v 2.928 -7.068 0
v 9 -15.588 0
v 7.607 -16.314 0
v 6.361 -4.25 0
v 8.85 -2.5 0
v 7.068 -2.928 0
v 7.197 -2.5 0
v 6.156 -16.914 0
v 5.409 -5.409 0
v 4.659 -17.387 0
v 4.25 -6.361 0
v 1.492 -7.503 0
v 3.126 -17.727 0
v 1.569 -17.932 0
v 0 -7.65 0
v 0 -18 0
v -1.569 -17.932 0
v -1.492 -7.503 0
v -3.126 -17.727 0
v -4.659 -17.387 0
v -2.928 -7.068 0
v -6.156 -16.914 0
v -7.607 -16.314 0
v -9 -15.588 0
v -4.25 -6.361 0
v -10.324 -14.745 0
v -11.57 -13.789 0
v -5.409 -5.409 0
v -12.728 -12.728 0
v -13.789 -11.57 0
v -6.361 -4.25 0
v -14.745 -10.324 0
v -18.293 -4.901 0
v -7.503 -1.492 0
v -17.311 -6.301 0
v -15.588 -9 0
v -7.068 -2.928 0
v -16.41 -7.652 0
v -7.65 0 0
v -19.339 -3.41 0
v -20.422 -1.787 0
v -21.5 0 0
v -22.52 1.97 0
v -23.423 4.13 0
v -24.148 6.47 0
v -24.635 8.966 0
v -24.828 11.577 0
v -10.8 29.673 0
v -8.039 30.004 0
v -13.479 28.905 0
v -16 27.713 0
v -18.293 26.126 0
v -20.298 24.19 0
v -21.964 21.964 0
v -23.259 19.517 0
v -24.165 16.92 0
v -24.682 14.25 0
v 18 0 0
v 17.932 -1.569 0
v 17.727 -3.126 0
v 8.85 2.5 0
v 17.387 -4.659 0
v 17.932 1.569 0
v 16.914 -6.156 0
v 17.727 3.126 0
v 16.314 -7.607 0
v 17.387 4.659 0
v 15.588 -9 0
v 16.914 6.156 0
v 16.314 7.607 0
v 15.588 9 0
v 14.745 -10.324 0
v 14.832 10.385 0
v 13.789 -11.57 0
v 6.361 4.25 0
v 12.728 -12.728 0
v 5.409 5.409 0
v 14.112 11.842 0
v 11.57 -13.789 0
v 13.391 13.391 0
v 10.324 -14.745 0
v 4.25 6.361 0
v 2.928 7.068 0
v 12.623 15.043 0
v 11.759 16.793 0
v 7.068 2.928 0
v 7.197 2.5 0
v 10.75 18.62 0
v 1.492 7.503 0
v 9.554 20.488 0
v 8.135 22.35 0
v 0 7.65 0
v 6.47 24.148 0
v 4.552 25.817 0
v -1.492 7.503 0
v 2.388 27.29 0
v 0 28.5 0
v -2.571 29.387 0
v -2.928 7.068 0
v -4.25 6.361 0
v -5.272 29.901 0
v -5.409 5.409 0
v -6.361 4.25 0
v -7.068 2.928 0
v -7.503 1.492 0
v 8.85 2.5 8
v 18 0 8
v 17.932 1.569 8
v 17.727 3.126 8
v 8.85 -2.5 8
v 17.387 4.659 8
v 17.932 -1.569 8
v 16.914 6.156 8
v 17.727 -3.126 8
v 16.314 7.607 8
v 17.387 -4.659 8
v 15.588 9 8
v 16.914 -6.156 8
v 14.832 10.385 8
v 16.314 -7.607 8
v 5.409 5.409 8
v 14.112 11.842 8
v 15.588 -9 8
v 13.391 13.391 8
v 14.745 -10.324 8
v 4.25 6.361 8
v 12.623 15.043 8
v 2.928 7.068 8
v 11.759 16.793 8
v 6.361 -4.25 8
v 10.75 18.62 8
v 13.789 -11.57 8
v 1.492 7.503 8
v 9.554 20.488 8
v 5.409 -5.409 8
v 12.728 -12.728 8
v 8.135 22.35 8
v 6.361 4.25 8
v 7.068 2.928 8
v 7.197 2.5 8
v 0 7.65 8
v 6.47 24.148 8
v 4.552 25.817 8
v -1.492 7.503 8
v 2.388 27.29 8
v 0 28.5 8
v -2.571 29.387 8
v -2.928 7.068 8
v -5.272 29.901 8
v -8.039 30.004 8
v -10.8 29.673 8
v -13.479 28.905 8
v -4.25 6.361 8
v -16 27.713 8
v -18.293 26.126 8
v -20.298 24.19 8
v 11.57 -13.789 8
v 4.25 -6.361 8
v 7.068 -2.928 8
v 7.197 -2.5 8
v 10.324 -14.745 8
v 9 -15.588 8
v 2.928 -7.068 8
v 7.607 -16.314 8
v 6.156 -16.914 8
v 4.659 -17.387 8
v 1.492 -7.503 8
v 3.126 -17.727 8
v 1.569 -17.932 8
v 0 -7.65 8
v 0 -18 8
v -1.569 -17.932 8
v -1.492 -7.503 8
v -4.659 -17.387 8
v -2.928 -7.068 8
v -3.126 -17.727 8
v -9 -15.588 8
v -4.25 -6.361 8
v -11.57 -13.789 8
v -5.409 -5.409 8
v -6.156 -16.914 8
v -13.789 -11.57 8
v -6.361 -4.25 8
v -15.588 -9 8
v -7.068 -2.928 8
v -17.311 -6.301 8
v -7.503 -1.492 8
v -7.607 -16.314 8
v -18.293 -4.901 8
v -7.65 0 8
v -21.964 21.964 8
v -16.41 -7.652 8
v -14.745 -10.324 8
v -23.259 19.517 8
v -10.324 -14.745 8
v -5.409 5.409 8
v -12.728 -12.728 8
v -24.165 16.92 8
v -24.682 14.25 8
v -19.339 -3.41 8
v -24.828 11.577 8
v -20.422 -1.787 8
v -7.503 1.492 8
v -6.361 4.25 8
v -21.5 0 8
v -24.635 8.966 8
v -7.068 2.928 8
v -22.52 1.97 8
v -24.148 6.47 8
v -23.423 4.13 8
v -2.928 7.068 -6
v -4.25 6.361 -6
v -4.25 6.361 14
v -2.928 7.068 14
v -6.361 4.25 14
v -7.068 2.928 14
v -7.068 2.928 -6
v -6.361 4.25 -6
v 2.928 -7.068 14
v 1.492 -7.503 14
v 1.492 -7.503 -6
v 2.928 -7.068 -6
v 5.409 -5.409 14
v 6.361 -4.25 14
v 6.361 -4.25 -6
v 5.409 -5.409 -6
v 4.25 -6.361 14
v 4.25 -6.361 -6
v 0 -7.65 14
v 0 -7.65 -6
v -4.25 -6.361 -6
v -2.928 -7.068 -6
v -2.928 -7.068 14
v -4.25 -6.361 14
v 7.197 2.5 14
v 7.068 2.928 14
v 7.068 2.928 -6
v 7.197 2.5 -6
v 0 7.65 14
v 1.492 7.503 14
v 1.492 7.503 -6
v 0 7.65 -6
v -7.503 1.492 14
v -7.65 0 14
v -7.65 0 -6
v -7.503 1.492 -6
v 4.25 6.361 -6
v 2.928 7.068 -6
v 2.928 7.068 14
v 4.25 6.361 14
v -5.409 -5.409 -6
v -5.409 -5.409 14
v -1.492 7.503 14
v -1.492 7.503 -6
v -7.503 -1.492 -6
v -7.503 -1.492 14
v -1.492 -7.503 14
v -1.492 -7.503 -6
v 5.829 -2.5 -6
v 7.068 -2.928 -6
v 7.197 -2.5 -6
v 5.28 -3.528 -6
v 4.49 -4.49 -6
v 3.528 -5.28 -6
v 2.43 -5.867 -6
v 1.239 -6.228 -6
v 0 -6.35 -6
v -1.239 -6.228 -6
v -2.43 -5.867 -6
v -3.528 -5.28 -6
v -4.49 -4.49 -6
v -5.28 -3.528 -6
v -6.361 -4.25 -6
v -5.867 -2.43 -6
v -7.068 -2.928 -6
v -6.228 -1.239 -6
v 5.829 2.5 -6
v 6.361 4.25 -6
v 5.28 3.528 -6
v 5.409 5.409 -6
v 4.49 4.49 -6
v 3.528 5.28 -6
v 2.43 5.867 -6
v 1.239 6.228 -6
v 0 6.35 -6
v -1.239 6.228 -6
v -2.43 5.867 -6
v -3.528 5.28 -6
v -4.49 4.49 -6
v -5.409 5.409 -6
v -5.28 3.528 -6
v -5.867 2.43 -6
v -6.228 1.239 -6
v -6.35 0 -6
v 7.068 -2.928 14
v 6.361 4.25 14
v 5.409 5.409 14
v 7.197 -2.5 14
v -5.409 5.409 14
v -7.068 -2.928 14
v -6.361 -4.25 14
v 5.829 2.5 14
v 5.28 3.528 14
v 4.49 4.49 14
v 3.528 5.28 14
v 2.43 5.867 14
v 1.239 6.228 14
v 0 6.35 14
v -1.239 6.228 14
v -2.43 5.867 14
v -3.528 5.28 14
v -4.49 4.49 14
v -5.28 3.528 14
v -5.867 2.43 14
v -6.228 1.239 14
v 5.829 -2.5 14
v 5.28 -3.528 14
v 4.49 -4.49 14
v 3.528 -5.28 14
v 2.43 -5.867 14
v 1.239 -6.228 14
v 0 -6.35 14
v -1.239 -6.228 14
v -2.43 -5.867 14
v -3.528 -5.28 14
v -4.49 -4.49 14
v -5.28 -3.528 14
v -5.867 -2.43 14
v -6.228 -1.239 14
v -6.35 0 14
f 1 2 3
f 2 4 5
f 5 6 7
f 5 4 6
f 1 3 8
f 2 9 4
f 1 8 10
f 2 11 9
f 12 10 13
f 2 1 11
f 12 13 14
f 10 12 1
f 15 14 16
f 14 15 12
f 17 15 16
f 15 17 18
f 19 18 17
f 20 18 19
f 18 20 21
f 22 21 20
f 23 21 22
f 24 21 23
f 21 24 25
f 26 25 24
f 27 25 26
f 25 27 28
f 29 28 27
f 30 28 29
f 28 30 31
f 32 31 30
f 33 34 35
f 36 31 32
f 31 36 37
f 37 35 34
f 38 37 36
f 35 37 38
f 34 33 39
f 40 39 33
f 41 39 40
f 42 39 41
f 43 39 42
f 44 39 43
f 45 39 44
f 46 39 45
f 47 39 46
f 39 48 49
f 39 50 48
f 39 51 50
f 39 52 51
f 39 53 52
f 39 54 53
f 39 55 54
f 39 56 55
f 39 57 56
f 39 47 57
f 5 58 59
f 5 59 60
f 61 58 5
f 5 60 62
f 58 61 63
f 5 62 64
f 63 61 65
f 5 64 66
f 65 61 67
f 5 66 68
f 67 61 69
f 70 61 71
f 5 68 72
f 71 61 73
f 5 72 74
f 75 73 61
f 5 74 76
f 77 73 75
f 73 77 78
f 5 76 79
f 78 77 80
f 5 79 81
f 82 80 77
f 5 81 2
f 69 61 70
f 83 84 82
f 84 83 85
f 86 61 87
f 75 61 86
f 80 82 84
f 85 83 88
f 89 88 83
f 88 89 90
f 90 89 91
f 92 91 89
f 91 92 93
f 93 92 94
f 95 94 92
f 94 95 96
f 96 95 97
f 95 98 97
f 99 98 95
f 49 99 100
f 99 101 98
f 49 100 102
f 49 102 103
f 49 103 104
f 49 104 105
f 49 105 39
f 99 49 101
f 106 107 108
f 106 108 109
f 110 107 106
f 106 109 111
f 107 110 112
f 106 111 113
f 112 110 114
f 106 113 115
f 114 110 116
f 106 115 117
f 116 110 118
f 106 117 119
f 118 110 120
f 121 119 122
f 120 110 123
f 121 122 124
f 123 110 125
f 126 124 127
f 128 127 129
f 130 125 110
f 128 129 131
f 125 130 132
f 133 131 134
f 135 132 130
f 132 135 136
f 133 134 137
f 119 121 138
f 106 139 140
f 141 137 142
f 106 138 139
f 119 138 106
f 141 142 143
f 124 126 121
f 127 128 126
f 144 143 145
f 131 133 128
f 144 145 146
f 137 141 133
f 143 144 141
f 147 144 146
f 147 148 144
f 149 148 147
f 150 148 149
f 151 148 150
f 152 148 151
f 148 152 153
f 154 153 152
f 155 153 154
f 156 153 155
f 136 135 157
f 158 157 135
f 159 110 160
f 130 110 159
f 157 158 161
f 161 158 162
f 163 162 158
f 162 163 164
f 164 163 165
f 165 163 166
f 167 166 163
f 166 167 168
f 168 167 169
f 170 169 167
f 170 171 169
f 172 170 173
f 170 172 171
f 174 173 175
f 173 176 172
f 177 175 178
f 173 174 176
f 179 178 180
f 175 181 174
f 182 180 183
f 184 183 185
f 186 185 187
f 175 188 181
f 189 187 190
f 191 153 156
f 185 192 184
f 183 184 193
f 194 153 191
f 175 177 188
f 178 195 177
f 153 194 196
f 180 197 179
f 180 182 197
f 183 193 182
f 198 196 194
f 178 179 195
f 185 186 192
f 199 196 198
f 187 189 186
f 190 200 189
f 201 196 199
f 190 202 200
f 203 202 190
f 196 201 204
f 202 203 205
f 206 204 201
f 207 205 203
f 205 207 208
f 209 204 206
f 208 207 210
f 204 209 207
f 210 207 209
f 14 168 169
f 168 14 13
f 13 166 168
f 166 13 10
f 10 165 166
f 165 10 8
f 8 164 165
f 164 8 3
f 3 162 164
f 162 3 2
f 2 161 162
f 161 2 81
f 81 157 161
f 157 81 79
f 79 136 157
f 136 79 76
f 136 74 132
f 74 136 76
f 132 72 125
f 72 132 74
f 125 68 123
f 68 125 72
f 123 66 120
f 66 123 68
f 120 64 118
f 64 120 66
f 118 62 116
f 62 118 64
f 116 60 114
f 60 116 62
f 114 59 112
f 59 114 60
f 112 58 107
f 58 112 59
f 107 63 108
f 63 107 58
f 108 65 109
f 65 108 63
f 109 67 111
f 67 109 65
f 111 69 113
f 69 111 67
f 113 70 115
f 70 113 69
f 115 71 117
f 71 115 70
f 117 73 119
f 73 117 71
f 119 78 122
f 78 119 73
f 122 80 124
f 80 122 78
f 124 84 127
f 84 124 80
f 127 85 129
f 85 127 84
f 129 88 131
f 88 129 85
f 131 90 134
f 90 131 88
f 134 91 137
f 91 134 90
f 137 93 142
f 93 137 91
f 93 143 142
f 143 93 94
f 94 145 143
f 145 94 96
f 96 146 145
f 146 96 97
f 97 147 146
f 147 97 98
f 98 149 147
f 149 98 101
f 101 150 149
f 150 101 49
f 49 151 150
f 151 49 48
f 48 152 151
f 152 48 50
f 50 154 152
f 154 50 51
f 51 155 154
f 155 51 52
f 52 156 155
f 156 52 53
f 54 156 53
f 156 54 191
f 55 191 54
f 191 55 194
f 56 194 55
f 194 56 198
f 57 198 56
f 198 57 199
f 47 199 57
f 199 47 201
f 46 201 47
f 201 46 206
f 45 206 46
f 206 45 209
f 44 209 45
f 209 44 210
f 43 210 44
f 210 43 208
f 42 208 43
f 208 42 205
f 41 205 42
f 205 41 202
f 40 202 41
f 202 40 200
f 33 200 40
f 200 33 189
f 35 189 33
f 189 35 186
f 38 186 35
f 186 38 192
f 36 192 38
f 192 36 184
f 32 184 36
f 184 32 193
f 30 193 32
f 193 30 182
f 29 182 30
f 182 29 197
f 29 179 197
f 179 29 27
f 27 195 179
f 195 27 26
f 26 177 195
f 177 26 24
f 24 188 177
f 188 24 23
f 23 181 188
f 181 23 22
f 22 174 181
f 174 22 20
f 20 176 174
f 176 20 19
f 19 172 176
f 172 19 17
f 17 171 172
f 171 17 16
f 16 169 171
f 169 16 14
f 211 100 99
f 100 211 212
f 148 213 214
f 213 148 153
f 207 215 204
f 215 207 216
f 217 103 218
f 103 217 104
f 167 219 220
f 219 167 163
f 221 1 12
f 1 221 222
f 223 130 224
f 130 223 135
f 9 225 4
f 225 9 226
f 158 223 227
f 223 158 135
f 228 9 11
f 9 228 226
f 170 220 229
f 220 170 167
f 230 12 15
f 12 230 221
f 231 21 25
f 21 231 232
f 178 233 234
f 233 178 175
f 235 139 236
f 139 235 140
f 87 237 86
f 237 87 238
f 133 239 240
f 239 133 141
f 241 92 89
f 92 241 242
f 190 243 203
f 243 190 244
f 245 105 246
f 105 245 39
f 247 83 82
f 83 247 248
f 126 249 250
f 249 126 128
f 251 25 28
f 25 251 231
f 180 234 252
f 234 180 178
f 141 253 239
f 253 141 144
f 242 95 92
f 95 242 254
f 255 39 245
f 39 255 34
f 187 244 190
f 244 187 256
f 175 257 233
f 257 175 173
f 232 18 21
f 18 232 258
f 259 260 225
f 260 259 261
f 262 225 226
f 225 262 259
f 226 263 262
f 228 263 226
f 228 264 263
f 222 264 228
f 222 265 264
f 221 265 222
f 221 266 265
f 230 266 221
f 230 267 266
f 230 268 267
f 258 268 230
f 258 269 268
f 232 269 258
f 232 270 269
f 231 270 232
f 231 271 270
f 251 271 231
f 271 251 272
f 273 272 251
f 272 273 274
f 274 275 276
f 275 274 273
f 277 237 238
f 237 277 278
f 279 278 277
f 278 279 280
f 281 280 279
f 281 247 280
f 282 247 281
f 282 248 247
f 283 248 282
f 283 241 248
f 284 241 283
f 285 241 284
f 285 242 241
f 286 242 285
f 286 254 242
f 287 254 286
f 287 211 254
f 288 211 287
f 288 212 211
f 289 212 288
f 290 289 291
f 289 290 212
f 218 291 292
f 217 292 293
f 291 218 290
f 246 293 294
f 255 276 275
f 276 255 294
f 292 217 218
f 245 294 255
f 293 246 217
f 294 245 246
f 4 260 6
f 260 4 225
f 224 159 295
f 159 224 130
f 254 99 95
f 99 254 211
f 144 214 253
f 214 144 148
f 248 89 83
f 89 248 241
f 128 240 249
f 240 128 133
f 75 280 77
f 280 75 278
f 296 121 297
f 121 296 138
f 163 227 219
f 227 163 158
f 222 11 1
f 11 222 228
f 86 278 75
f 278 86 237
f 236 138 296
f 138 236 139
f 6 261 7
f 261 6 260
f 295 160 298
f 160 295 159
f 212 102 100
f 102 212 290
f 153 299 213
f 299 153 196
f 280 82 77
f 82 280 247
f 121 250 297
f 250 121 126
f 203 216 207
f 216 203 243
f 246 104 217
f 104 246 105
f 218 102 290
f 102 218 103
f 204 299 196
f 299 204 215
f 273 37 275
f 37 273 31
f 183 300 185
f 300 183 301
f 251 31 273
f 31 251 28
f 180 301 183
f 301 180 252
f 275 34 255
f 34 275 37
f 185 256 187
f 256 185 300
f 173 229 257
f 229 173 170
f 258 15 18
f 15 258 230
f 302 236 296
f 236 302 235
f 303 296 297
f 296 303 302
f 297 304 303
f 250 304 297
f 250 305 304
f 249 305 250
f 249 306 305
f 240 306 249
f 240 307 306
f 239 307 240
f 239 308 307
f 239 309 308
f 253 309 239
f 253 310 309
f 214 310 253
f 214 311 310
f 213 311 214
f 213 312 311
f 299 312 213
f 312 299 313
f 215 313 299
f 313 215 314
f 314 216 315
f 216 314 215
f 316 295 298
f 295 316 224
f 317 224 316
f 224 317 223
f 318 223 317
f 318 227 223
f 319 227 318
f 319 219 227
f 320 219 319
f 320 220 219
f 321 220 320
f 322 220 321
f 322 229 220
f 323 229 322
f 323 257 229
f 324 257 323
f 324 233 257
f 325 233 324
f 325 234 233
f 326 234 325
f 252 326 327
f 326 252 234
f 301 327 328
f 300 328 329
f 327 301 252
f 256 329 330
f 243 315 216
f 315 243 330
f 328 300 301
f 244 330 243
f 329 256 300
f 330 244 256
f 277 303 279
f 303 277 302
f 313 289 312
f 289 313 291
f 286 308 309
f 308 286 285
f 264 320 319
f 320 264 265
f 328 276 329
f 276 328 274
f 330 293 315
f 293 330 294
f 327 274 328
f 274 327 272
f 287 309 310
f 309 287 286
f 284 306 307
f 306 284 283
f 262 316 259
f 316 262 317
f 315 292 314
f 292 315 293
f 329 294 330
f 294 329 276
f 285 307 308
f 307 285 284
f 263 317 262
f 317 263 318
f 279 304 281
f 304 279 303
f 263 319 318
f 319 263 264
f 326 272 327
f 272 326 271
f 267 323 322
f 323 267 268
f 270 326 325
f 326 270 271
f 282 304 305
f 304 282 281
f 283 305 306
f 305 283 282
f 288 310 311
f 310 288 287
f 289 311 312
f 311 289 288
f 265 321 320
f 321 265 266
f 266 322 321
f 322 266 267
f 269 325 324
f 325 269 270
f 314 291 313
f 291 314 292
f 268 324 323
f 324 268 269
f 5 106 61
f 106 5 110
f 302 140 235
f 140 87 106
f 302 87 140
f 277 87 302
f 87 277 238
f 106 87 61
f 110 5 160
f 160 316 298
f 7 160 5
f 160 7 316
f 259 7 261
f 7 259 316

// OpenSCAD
$fn = 32;

// ----------------------------------------------------------------------
// Cam: base radius 18 mm with a 14 mm lift over 180 degrees
// ----------------------------------------------------------------------

// --- parameters (mm) ---
base_r = 18;              // base radius
lift = 14;                // lift height above the base radius
lift_span = 180;          // angular width of the lift
lift_start = 30;          // angle where the lift starts
cam_t = 8;                // cam plate thickness
hub_d = 15.3;             // hub diameter
hub_h = 20;               // hub height
bore_d = 12.7;            // bore
key_w = 5;                // keyway width
key_depth = 1.6;          // keyway depth

cam_profile = [[18, 0], [17.932, 1.569], [17.727, 3.126], [17.387, 4.659], [16.914, 6.156], [16.314, 7.607], [15.588, 9], [14.832, 10.385], [14.112, 11.842], [13.391, 13.391], [12.623, 15.043], [11.759, 16.793], [10.75, 18.62], [9.554, 20.488], [8.135, 22.35], [6.47, 24.148], [4.552, 25.817], [2.388, 27.29], [0, 28.5], [-2.571, 29.387], [-5.272, 29.901], [-8.039, 30.004], [-10.8, 29.673], [-13.479, 28.905], [-16, 27.713], [-18.293, 26.126], [-20.298, 24.19], [-21.964, 21.964], [-23.259, 19.517], [-24.165, 16.92], [-24.682, 14.25], [-24.828, 11.577], [-24.635, 8.966], [-24.148, 6.47], [-23.423, 4.13], [-22.52, 1.97], [-21.5, 0], [-20.422, -1.787], [-19.339, -3.41], [-18.293, -4.901], [-17.311, -6.301], [-16.41, -7.652], [-15.588, -9], [-14.745, -10.324], [-13.789, -11.57], [-12.728, -12.728], [-11.57, -13.789], [-10.324, -14.745], [-9, -15.588], [-7.607, -16.314], [-6.156, -16.914], [-4.659, -17.387], [-3.126, -17.727], [-1.569, -17.932], [0, -18], [1.569, -17.932], [3.126, -17.727], [4.659, -17.387], [6.156, -16.914], [7.607, -16.314], [9, -15.588], [10.324, -14.745], [11.57, -13.789], [12.728, -12.728], [13.789, -11.57], [14.745, -10.324], [15.588, -9], [16.314, -7.607], [16.914, -6.156], [17.387, -4.659], [17.727, -3.126], [17.932, -1.569]];

difference() {
  union() {
    linear_extrude(height = cam_t) polygon(cam_profile);
    /* hub, proud of the cam plate on both sides */
    translate([0, 0, -6]) cylinder(h = hub_h, d = hub_d);
  }
  /* bore through the hub, 2.5 mm clear on both faces */
  translate([0, 0, -8.5]) cylinder(h = hub_h + 5, d = bore_d);
  /* keyway, milled through the whole hub */
  translate([4.75, -2.5, -8.5]) cube([4.1, 5, 25]);
}
